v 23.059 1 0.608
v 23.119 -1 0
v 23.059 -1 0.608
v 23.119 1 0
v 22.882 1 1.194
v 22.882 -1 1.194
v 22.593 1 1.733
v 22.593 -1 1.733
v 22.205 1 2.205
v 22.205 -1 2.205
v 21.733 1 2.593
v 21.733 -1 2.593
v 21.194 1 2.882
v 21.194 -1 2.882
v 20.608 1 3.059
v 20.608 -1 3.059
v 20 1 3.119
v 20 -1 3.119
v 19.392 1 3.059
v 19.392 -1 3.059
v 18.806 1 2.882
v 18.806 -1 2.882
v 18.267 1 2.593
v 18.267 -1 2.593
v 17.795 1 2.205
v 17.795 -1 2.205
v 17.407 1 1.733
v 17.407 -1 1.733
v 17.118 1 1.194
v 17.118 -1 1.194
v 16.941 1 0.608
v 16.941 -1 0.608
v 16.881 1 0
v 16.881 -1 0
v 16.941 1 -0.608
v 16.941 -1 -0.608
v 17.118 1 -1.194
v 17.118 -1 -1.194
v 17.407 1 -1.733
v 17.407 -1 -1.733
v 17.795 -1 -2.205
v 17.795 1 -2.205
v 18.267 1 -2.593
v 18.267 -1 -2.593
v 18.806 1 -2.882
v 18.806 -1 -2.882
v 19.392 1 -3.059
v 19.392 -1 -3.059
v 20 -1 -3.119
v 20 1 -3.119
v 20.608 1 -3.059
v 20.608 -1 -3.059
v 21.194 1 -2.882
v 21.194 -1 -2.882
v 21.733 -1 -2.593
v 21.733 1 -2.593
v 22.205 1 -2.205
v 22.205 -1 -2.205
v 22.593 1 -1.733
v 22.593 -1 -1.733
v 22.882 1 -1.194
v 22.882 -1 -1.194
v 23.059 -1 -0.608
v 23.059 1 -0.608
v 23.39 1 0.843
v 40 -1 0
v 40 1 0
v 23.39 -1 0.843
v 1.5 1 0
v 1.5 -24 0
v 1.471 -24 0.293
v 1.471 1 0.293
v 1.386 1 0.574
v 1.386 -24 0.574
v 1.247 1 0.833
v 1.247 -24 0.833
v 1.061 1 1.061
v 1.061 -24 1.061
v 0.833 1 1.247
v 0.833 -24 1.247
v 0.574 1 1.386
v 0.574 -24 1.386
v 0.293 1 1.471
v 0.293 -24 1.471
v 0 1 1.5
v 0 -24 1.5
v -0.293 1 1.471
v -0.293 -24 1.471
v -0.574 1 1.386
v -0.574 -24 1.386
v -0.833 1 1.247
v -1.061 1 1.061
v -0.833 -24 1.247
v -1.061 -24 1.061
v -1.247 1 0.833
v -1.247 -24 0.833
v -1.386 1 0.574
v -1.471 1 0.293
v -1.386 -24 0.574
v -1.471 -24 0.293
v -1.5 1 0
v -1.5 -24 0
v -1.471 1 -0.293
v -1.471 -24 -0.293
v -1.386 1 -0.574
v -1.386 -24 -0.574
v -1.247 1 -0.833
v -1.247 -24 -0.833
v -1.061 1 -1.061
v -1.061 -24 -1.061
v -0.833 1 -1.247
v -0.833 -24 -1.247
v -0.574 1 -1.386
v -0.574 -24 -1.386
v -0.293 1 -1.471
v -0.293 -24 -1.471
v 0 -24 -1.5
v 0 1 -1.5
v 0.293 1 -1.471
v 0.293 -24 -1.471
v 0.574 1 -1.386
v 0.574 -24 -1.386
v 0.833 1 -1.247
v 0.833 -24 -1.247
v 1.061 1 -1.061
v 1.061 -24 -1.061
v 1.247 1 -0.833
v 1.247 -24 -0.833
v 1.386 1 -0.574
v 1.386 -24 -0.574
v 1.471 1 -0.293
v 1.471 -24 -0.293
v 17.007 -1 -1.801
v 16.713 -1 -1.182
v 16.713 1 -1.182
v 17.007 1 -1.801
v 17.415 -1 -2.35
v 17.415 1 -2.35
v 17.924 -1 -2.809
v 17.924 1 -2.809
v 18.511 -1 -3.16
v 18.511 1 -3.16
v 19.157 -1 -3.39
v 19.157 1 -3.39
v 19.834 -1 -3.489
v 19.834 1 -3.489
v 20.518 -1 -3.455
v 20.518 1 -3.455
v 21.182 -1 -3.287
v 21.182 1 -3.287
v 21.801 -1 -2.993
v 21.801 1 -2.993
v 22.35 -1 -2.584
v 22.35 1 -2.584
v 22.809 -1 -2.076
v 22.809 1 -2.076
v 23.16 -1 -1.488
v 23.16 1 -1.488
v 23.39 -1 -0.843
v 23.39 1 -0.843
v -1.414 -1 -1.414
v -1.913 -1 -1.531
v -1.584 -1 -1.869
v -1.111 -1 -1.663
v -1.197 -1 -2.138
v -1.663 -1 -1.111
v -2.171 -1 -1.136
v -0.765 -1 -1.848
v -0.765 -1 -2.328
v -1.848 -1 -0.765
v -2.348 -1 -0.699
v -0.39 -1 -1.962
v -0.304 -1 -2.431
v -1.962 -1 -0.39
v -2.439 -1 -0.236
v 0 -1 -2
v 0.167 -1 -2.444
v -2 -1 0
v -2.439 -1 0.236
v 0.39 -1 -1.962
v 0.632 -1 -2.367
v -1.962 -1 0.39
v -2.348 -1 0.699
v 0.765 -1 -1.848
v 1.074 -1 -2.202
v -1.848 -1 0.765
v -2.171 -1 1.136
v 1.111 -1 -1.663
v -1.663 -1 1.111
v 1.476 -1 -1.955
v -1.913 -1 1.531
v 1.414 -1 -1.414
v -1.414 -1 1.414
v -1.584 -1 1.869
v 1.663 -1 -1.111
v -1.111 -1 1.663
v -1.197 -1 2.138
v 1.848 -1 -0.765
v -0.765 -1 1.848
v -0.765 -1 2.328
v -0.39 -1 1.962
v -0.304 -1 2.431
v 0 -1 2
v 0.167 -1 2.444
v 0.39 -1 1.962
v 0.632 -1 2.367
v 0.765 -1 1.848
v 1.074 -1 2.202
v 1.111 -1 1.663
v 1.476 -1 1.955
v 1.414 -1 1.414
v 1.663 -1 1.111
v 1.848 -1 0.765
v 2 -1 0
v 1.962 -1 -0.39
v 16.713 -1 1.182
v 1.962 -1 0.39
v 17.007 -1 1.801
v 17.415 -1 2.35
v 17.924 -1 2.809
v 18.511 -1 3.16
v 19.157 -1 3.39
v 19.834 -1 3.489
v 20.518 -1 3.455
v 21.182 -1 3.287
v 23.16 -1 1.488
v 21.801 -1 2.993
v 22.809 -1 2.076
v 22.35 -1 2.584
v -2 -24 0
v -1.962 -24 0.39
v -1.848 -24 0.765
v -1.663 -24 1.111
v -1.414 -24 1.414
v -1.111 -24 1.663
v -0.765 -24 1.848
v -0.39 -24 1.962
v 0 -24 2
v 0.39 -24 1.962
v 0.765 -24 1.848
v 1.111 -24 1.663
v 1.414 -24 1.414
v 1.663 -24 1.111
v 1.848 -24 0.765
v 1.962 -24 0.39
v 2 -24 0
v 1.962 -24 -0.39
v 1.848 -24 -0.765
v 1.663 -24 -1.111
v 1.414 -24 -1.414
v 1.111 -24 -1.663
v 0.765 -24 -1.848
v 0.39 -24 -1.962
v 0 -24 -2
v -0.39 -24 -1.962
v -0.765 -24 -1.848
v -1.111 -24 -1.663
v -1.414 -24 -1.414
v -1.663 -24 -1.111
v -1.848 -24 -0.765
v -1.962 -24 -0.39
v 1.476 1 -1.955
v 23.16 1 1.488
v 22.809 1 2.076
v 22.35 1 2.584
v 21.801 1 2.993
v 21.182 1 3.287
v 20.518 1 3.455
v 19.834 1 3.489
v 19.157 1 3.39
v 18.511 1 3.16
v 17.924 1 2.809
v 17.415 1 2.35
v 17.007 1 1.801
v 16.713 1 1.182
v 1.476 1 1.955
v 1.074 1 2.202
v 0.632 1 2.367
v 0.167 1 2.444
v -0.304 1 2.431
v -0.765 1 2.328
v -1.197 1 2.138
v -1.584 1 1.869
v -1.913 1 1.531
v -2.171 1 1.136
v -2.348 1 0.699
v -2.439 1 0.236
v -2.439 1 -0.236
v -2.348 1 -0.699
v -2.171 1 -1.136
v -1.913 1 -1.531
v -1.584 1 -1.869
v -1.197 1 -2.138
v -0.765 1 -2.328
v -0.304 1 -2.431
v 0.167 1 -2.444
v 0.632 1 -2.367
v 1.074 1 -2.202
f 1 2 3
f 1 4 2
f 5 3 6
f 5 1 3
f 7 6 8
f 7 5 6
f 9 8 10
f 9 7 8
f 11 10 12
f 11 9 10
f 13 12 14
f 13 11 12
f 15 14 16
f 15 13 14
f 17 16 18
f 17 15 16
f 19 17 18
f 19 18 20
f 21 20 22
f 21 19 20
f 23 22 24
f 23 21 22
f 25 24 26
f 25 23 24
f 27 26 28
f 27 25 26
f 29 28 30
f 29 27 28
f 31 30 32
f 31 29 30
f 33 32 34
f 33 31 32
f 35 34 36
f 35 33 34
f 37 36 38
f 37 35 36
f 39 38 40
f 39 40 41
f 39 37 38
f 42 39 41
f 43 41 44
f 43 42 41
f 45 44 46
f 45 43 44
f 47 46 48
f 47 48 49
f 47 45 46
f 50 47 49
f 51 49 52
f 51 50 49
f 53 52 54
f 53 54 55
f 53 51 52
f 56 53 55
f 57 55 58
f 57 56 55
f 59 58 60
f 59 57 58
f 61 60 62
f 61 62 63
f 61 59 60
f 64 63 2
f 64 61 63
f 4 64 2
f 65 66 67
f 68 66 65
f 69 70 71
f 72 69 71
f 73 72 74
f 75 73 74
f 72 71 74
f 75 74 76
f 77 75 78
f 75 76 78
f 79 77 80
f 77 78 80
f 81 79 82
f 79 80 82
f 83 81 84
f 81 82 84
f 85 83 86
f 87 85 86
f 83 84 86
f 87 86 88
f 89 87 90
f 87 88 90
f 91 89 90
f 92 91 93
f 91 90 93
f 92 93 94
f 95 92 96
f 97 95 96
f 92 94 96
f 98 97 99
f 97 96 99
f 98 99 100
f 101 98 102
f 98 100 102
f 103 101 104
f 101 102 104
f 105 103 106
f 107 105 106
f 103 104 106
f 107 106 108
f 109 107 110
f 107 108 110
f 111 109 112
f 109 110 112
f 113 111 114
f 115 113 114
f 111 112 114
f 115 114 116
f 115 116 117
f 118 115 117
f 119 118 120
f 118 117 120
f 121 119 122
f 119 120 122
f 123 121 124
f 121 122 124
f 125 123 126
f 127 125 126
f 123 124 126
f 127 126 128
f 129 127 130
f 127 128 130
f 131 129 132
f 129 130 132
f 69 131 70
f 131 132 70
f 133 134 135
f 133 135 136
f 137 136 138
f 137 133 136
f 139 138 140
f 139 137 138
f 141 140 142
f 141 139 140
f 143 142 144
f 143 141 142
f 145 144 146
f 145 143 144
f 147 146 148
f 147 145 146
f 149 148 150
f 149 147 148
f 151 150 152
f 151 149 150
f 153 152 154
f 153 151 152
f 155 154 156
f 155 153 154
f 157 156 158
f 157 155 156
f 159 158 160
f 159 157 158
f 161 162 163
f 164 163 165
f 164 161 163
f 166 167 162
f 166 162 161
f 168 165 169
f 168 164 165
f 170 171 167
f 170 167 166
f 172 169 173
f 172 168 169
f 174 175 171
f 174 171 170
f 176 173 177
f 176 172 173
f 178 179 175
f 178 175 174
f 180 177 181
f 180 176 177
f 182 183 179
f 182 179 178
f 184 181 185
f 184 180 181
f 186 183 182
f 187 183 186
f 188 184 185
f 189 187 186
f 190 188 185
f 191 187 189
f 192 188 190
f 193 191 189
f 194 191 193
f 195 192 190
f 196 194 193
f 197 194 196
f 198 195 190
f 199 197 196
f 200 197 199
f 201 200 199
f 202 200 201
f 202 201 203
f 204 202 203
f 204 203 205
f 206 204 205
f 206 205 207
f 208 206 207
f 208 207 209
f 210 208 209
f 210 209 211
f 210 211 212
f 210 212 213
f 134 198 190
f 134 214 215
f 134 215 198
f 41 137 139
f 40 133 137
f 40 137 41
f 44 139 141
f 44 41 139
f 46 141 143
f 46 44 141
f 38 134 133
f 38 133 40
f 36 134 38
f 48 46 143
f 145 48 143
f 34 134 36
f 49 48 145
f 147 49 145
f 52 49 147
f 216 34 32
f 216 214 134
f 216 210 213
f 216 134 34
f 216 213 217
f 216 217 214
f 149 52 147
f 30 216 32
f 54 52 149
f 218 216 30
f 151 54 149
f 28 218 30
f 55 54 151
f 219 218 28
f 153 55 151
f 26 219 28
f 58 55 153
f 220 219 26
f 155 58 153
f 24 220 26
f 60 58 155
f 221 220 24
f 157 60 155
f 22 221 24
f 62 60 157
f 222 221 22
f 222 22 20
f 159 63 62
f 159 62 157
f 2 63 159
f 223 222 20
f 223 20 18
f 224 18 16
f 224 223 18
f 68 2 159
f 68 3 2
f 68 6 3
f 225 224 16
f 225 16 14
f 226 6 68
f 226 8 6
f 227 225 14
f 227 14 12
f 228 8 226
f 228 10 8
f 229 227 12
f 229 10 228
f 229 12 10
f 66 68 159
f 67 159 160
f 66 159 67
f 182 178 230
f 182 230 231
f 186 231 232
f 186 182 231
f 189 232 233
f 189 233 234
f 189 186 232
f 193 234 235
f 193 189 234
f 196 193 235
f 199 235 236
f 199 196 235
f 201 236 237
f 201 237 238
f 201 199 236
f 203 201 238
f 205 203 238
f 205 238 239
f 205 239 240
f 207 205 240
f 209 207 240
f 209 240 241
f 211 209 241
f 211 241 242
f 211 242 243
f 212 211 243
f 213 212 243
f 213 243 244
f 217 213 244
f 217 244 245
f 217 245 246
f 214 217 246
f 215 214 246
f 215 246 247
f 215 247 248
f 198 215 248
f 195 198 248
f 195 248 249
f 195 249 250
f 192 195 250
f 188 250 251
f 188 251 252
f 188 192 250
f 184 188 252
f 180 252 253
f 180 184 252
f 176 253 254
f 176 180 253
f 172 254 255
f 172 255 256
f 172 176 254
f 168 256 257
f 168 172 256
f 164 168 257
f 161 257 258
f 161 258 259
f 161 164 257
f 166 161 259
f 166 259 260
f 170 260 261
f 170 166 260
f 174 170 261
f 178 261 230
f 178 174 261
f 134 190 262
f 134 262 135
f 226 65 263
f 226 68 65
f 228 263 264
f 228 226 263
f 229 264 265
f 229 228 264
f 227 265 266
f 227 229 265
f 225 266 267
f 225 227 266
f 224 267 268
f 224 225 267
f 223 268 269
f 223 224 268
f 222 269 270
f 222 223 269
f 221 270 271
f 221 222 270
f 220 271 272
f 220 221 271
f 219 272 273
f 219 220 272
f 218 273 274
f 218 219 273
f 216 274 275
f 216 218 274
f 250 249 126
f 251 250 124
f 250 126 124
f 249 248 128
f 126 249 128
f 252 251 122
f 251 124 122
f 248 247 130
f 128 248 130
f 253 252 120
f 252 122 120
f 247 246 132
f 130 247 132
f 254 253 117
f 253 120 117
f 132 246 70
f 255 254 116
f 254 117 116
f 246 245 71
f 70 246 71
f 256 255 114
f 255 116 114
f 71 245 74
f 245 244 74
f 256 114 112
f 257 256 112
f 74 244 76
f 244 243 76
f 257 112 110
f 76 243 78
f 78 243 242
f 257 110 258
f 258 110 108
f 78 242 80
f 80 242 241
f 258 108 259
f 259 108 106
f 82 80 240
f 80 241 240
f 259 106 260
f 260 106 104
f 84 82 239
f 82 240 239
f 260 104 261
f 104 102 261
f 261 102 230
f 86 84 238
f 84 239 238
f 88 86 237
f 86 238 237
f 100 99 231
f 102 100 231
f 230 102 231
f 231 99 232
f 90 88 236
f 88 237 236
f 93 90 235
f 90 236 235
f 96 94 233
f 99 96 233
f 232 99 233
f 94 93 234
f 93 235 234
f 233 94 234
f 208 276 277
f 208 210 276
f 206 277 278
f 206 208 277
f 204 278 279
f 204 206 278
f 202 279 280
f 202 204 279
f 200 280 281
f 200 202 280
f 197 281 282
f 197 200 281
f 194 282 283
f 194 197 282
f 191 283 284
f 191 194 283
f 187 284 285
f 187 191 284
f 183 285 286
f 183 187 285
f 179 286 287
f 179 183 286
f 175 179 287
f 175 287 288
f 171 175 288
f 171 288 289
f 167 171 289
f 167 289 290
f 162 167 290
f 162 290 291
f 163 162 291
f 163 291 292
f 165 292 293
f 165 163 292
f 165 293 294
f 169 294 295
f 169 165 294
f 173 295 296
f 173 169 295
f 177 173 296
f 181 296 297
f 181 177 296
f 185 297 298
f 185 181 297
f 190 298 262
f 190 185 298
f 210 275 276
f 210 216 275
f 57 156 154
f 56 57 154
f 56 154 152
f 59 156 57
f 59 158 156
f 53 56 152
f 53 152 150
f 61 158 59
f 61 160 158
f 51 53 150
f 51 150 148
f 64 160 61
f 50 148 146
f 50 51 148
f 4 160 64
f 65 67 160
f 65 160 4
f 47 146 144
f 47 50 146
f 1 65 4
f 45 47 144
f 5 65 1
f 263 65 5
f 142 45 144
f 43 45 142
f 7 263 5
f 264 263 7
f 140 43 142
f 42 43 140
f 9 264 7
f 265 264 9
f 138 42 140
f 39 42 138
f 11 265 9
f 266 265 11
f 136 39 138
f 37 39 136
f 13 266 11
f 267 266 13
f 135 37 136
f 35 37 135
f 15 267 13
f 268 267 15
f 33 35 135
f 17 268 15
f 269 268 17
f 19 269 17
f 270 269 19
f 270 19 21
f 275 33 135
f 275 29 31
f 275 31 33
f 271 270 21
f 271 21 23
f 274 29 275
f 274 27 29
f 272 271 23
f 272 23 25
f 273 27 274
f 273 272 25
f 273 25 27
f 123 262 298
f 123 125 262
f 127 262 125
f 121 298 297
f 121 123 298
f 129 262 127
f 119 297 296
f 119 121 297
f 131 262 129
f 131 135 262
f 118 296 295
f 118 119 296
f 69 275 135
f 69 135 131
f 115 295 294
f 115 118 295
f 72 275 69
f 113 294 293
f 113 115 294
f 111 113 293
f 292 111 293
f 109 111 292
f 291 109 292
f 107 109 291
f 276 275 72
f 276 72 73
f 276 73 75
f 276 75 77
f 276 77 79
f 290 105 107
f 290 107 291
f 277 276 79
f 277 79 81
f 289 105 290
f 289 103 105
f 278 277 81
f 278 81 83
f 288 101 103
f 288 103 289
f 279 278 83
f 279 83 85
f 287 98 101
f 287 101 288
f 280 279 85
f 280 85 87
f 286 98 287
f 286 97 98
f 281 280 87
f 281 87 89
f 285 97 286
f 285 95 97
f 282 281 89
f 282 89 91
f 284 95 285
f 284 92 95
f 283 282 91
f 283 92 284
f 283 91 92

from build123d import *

# Parameters (mm, degrees)
F0_R     = 3.119034
F1_DEPTH = 1
F2_R     = 2
F3_DEPTH = 25
F4_R     = 1.5
F5_DEPTH = 25


with BuildPart() as f1:
    # F0 (on Front) → F1 (new body, symmetric)
    with BuildSketch(Plane.XZ):
        with BuildLine():
            ThreePointArc((1.47637, -1.955206), (2.193126, -1.092106), (2.45, 0))
            ThreePointArc((2.45, 0), (2.193126, 1.092106), (1.47637, 1.955206))
            ThreePointArc((1.47637, 1.955206), (-2.45, 0), (1.47637, -1.955206))
        make_face()
        with BuildLine():
            ThreePointArc((1.47637, 1.955206), (2.193126, 1.092106), (2.45, 0))
            ThreePointArc((2.45, 0), (2.193126, -1.092106), (1.47637, -1.955206))
            Line((1.47637, -1.955206), (16.712802, -1.181905))
            ThreePointArc((16.712802, -1.181905), (16.506782, 0), (16.712802, 1.181905))
            Line((16.712802, 1.181905), (1.47637, 1.955206))
        make_face()
        with BuildLine():
            ThreePointArc((23.38997, 0.843016), (20.177065, 3.488727), (16.712802, 1.181905))
            ThreePointArc((16.712802, 1.181905), (16.506782, 0), (16.712802, -1.181905))
            ThreePointArc((16.712802, -1.181905), (20.177065, -3.488727), (23.38997, -0.843016))
            ThreePointArc((23.38997, -0.843016), (23.46731, -0.424657), (23.493218, 0))
            ThreePointArc((23.493218, 0), (23.46731, 0.424657), (23.38997, 0.843016))
        make_face()
        with Locations((20, 0)):
            Circle(F0_R, mode=Mode.SUBTRACT)
        with BuildLine():
            Line((40, 0), (23.38997, 0.843016))
            ThreePointArc((23.38997, 0.843016), (23.46731, 0.424657), (23.493218, 0))
            ThreePointArc((23.493218, 0), (23.46731, -0.424657), (23.38997, -0.843016))
            Line((23.38997, -0.843016), (40, 0))
        make_face()
    extrude(amount=F1_DEPTH, both=True)

    # F2 (on face) → F3 (join)
    with BuildSketch(Plane(origin=(0, 1, 0), x_dir=(-1, 0, 0), z_dir=(0, 1, 0))):
        Circle(F2_R)
    extrude(amount=-F3_DEPTH)

    # F4 (on face) → F5 (cut)
    with BuildSketch(Plane.XZ.offset(24)):
        Circle(F4_R)
    extrude(amount=-F5_DEPTH, mode=Mode.SUBTRACT)


solid = f1.part
